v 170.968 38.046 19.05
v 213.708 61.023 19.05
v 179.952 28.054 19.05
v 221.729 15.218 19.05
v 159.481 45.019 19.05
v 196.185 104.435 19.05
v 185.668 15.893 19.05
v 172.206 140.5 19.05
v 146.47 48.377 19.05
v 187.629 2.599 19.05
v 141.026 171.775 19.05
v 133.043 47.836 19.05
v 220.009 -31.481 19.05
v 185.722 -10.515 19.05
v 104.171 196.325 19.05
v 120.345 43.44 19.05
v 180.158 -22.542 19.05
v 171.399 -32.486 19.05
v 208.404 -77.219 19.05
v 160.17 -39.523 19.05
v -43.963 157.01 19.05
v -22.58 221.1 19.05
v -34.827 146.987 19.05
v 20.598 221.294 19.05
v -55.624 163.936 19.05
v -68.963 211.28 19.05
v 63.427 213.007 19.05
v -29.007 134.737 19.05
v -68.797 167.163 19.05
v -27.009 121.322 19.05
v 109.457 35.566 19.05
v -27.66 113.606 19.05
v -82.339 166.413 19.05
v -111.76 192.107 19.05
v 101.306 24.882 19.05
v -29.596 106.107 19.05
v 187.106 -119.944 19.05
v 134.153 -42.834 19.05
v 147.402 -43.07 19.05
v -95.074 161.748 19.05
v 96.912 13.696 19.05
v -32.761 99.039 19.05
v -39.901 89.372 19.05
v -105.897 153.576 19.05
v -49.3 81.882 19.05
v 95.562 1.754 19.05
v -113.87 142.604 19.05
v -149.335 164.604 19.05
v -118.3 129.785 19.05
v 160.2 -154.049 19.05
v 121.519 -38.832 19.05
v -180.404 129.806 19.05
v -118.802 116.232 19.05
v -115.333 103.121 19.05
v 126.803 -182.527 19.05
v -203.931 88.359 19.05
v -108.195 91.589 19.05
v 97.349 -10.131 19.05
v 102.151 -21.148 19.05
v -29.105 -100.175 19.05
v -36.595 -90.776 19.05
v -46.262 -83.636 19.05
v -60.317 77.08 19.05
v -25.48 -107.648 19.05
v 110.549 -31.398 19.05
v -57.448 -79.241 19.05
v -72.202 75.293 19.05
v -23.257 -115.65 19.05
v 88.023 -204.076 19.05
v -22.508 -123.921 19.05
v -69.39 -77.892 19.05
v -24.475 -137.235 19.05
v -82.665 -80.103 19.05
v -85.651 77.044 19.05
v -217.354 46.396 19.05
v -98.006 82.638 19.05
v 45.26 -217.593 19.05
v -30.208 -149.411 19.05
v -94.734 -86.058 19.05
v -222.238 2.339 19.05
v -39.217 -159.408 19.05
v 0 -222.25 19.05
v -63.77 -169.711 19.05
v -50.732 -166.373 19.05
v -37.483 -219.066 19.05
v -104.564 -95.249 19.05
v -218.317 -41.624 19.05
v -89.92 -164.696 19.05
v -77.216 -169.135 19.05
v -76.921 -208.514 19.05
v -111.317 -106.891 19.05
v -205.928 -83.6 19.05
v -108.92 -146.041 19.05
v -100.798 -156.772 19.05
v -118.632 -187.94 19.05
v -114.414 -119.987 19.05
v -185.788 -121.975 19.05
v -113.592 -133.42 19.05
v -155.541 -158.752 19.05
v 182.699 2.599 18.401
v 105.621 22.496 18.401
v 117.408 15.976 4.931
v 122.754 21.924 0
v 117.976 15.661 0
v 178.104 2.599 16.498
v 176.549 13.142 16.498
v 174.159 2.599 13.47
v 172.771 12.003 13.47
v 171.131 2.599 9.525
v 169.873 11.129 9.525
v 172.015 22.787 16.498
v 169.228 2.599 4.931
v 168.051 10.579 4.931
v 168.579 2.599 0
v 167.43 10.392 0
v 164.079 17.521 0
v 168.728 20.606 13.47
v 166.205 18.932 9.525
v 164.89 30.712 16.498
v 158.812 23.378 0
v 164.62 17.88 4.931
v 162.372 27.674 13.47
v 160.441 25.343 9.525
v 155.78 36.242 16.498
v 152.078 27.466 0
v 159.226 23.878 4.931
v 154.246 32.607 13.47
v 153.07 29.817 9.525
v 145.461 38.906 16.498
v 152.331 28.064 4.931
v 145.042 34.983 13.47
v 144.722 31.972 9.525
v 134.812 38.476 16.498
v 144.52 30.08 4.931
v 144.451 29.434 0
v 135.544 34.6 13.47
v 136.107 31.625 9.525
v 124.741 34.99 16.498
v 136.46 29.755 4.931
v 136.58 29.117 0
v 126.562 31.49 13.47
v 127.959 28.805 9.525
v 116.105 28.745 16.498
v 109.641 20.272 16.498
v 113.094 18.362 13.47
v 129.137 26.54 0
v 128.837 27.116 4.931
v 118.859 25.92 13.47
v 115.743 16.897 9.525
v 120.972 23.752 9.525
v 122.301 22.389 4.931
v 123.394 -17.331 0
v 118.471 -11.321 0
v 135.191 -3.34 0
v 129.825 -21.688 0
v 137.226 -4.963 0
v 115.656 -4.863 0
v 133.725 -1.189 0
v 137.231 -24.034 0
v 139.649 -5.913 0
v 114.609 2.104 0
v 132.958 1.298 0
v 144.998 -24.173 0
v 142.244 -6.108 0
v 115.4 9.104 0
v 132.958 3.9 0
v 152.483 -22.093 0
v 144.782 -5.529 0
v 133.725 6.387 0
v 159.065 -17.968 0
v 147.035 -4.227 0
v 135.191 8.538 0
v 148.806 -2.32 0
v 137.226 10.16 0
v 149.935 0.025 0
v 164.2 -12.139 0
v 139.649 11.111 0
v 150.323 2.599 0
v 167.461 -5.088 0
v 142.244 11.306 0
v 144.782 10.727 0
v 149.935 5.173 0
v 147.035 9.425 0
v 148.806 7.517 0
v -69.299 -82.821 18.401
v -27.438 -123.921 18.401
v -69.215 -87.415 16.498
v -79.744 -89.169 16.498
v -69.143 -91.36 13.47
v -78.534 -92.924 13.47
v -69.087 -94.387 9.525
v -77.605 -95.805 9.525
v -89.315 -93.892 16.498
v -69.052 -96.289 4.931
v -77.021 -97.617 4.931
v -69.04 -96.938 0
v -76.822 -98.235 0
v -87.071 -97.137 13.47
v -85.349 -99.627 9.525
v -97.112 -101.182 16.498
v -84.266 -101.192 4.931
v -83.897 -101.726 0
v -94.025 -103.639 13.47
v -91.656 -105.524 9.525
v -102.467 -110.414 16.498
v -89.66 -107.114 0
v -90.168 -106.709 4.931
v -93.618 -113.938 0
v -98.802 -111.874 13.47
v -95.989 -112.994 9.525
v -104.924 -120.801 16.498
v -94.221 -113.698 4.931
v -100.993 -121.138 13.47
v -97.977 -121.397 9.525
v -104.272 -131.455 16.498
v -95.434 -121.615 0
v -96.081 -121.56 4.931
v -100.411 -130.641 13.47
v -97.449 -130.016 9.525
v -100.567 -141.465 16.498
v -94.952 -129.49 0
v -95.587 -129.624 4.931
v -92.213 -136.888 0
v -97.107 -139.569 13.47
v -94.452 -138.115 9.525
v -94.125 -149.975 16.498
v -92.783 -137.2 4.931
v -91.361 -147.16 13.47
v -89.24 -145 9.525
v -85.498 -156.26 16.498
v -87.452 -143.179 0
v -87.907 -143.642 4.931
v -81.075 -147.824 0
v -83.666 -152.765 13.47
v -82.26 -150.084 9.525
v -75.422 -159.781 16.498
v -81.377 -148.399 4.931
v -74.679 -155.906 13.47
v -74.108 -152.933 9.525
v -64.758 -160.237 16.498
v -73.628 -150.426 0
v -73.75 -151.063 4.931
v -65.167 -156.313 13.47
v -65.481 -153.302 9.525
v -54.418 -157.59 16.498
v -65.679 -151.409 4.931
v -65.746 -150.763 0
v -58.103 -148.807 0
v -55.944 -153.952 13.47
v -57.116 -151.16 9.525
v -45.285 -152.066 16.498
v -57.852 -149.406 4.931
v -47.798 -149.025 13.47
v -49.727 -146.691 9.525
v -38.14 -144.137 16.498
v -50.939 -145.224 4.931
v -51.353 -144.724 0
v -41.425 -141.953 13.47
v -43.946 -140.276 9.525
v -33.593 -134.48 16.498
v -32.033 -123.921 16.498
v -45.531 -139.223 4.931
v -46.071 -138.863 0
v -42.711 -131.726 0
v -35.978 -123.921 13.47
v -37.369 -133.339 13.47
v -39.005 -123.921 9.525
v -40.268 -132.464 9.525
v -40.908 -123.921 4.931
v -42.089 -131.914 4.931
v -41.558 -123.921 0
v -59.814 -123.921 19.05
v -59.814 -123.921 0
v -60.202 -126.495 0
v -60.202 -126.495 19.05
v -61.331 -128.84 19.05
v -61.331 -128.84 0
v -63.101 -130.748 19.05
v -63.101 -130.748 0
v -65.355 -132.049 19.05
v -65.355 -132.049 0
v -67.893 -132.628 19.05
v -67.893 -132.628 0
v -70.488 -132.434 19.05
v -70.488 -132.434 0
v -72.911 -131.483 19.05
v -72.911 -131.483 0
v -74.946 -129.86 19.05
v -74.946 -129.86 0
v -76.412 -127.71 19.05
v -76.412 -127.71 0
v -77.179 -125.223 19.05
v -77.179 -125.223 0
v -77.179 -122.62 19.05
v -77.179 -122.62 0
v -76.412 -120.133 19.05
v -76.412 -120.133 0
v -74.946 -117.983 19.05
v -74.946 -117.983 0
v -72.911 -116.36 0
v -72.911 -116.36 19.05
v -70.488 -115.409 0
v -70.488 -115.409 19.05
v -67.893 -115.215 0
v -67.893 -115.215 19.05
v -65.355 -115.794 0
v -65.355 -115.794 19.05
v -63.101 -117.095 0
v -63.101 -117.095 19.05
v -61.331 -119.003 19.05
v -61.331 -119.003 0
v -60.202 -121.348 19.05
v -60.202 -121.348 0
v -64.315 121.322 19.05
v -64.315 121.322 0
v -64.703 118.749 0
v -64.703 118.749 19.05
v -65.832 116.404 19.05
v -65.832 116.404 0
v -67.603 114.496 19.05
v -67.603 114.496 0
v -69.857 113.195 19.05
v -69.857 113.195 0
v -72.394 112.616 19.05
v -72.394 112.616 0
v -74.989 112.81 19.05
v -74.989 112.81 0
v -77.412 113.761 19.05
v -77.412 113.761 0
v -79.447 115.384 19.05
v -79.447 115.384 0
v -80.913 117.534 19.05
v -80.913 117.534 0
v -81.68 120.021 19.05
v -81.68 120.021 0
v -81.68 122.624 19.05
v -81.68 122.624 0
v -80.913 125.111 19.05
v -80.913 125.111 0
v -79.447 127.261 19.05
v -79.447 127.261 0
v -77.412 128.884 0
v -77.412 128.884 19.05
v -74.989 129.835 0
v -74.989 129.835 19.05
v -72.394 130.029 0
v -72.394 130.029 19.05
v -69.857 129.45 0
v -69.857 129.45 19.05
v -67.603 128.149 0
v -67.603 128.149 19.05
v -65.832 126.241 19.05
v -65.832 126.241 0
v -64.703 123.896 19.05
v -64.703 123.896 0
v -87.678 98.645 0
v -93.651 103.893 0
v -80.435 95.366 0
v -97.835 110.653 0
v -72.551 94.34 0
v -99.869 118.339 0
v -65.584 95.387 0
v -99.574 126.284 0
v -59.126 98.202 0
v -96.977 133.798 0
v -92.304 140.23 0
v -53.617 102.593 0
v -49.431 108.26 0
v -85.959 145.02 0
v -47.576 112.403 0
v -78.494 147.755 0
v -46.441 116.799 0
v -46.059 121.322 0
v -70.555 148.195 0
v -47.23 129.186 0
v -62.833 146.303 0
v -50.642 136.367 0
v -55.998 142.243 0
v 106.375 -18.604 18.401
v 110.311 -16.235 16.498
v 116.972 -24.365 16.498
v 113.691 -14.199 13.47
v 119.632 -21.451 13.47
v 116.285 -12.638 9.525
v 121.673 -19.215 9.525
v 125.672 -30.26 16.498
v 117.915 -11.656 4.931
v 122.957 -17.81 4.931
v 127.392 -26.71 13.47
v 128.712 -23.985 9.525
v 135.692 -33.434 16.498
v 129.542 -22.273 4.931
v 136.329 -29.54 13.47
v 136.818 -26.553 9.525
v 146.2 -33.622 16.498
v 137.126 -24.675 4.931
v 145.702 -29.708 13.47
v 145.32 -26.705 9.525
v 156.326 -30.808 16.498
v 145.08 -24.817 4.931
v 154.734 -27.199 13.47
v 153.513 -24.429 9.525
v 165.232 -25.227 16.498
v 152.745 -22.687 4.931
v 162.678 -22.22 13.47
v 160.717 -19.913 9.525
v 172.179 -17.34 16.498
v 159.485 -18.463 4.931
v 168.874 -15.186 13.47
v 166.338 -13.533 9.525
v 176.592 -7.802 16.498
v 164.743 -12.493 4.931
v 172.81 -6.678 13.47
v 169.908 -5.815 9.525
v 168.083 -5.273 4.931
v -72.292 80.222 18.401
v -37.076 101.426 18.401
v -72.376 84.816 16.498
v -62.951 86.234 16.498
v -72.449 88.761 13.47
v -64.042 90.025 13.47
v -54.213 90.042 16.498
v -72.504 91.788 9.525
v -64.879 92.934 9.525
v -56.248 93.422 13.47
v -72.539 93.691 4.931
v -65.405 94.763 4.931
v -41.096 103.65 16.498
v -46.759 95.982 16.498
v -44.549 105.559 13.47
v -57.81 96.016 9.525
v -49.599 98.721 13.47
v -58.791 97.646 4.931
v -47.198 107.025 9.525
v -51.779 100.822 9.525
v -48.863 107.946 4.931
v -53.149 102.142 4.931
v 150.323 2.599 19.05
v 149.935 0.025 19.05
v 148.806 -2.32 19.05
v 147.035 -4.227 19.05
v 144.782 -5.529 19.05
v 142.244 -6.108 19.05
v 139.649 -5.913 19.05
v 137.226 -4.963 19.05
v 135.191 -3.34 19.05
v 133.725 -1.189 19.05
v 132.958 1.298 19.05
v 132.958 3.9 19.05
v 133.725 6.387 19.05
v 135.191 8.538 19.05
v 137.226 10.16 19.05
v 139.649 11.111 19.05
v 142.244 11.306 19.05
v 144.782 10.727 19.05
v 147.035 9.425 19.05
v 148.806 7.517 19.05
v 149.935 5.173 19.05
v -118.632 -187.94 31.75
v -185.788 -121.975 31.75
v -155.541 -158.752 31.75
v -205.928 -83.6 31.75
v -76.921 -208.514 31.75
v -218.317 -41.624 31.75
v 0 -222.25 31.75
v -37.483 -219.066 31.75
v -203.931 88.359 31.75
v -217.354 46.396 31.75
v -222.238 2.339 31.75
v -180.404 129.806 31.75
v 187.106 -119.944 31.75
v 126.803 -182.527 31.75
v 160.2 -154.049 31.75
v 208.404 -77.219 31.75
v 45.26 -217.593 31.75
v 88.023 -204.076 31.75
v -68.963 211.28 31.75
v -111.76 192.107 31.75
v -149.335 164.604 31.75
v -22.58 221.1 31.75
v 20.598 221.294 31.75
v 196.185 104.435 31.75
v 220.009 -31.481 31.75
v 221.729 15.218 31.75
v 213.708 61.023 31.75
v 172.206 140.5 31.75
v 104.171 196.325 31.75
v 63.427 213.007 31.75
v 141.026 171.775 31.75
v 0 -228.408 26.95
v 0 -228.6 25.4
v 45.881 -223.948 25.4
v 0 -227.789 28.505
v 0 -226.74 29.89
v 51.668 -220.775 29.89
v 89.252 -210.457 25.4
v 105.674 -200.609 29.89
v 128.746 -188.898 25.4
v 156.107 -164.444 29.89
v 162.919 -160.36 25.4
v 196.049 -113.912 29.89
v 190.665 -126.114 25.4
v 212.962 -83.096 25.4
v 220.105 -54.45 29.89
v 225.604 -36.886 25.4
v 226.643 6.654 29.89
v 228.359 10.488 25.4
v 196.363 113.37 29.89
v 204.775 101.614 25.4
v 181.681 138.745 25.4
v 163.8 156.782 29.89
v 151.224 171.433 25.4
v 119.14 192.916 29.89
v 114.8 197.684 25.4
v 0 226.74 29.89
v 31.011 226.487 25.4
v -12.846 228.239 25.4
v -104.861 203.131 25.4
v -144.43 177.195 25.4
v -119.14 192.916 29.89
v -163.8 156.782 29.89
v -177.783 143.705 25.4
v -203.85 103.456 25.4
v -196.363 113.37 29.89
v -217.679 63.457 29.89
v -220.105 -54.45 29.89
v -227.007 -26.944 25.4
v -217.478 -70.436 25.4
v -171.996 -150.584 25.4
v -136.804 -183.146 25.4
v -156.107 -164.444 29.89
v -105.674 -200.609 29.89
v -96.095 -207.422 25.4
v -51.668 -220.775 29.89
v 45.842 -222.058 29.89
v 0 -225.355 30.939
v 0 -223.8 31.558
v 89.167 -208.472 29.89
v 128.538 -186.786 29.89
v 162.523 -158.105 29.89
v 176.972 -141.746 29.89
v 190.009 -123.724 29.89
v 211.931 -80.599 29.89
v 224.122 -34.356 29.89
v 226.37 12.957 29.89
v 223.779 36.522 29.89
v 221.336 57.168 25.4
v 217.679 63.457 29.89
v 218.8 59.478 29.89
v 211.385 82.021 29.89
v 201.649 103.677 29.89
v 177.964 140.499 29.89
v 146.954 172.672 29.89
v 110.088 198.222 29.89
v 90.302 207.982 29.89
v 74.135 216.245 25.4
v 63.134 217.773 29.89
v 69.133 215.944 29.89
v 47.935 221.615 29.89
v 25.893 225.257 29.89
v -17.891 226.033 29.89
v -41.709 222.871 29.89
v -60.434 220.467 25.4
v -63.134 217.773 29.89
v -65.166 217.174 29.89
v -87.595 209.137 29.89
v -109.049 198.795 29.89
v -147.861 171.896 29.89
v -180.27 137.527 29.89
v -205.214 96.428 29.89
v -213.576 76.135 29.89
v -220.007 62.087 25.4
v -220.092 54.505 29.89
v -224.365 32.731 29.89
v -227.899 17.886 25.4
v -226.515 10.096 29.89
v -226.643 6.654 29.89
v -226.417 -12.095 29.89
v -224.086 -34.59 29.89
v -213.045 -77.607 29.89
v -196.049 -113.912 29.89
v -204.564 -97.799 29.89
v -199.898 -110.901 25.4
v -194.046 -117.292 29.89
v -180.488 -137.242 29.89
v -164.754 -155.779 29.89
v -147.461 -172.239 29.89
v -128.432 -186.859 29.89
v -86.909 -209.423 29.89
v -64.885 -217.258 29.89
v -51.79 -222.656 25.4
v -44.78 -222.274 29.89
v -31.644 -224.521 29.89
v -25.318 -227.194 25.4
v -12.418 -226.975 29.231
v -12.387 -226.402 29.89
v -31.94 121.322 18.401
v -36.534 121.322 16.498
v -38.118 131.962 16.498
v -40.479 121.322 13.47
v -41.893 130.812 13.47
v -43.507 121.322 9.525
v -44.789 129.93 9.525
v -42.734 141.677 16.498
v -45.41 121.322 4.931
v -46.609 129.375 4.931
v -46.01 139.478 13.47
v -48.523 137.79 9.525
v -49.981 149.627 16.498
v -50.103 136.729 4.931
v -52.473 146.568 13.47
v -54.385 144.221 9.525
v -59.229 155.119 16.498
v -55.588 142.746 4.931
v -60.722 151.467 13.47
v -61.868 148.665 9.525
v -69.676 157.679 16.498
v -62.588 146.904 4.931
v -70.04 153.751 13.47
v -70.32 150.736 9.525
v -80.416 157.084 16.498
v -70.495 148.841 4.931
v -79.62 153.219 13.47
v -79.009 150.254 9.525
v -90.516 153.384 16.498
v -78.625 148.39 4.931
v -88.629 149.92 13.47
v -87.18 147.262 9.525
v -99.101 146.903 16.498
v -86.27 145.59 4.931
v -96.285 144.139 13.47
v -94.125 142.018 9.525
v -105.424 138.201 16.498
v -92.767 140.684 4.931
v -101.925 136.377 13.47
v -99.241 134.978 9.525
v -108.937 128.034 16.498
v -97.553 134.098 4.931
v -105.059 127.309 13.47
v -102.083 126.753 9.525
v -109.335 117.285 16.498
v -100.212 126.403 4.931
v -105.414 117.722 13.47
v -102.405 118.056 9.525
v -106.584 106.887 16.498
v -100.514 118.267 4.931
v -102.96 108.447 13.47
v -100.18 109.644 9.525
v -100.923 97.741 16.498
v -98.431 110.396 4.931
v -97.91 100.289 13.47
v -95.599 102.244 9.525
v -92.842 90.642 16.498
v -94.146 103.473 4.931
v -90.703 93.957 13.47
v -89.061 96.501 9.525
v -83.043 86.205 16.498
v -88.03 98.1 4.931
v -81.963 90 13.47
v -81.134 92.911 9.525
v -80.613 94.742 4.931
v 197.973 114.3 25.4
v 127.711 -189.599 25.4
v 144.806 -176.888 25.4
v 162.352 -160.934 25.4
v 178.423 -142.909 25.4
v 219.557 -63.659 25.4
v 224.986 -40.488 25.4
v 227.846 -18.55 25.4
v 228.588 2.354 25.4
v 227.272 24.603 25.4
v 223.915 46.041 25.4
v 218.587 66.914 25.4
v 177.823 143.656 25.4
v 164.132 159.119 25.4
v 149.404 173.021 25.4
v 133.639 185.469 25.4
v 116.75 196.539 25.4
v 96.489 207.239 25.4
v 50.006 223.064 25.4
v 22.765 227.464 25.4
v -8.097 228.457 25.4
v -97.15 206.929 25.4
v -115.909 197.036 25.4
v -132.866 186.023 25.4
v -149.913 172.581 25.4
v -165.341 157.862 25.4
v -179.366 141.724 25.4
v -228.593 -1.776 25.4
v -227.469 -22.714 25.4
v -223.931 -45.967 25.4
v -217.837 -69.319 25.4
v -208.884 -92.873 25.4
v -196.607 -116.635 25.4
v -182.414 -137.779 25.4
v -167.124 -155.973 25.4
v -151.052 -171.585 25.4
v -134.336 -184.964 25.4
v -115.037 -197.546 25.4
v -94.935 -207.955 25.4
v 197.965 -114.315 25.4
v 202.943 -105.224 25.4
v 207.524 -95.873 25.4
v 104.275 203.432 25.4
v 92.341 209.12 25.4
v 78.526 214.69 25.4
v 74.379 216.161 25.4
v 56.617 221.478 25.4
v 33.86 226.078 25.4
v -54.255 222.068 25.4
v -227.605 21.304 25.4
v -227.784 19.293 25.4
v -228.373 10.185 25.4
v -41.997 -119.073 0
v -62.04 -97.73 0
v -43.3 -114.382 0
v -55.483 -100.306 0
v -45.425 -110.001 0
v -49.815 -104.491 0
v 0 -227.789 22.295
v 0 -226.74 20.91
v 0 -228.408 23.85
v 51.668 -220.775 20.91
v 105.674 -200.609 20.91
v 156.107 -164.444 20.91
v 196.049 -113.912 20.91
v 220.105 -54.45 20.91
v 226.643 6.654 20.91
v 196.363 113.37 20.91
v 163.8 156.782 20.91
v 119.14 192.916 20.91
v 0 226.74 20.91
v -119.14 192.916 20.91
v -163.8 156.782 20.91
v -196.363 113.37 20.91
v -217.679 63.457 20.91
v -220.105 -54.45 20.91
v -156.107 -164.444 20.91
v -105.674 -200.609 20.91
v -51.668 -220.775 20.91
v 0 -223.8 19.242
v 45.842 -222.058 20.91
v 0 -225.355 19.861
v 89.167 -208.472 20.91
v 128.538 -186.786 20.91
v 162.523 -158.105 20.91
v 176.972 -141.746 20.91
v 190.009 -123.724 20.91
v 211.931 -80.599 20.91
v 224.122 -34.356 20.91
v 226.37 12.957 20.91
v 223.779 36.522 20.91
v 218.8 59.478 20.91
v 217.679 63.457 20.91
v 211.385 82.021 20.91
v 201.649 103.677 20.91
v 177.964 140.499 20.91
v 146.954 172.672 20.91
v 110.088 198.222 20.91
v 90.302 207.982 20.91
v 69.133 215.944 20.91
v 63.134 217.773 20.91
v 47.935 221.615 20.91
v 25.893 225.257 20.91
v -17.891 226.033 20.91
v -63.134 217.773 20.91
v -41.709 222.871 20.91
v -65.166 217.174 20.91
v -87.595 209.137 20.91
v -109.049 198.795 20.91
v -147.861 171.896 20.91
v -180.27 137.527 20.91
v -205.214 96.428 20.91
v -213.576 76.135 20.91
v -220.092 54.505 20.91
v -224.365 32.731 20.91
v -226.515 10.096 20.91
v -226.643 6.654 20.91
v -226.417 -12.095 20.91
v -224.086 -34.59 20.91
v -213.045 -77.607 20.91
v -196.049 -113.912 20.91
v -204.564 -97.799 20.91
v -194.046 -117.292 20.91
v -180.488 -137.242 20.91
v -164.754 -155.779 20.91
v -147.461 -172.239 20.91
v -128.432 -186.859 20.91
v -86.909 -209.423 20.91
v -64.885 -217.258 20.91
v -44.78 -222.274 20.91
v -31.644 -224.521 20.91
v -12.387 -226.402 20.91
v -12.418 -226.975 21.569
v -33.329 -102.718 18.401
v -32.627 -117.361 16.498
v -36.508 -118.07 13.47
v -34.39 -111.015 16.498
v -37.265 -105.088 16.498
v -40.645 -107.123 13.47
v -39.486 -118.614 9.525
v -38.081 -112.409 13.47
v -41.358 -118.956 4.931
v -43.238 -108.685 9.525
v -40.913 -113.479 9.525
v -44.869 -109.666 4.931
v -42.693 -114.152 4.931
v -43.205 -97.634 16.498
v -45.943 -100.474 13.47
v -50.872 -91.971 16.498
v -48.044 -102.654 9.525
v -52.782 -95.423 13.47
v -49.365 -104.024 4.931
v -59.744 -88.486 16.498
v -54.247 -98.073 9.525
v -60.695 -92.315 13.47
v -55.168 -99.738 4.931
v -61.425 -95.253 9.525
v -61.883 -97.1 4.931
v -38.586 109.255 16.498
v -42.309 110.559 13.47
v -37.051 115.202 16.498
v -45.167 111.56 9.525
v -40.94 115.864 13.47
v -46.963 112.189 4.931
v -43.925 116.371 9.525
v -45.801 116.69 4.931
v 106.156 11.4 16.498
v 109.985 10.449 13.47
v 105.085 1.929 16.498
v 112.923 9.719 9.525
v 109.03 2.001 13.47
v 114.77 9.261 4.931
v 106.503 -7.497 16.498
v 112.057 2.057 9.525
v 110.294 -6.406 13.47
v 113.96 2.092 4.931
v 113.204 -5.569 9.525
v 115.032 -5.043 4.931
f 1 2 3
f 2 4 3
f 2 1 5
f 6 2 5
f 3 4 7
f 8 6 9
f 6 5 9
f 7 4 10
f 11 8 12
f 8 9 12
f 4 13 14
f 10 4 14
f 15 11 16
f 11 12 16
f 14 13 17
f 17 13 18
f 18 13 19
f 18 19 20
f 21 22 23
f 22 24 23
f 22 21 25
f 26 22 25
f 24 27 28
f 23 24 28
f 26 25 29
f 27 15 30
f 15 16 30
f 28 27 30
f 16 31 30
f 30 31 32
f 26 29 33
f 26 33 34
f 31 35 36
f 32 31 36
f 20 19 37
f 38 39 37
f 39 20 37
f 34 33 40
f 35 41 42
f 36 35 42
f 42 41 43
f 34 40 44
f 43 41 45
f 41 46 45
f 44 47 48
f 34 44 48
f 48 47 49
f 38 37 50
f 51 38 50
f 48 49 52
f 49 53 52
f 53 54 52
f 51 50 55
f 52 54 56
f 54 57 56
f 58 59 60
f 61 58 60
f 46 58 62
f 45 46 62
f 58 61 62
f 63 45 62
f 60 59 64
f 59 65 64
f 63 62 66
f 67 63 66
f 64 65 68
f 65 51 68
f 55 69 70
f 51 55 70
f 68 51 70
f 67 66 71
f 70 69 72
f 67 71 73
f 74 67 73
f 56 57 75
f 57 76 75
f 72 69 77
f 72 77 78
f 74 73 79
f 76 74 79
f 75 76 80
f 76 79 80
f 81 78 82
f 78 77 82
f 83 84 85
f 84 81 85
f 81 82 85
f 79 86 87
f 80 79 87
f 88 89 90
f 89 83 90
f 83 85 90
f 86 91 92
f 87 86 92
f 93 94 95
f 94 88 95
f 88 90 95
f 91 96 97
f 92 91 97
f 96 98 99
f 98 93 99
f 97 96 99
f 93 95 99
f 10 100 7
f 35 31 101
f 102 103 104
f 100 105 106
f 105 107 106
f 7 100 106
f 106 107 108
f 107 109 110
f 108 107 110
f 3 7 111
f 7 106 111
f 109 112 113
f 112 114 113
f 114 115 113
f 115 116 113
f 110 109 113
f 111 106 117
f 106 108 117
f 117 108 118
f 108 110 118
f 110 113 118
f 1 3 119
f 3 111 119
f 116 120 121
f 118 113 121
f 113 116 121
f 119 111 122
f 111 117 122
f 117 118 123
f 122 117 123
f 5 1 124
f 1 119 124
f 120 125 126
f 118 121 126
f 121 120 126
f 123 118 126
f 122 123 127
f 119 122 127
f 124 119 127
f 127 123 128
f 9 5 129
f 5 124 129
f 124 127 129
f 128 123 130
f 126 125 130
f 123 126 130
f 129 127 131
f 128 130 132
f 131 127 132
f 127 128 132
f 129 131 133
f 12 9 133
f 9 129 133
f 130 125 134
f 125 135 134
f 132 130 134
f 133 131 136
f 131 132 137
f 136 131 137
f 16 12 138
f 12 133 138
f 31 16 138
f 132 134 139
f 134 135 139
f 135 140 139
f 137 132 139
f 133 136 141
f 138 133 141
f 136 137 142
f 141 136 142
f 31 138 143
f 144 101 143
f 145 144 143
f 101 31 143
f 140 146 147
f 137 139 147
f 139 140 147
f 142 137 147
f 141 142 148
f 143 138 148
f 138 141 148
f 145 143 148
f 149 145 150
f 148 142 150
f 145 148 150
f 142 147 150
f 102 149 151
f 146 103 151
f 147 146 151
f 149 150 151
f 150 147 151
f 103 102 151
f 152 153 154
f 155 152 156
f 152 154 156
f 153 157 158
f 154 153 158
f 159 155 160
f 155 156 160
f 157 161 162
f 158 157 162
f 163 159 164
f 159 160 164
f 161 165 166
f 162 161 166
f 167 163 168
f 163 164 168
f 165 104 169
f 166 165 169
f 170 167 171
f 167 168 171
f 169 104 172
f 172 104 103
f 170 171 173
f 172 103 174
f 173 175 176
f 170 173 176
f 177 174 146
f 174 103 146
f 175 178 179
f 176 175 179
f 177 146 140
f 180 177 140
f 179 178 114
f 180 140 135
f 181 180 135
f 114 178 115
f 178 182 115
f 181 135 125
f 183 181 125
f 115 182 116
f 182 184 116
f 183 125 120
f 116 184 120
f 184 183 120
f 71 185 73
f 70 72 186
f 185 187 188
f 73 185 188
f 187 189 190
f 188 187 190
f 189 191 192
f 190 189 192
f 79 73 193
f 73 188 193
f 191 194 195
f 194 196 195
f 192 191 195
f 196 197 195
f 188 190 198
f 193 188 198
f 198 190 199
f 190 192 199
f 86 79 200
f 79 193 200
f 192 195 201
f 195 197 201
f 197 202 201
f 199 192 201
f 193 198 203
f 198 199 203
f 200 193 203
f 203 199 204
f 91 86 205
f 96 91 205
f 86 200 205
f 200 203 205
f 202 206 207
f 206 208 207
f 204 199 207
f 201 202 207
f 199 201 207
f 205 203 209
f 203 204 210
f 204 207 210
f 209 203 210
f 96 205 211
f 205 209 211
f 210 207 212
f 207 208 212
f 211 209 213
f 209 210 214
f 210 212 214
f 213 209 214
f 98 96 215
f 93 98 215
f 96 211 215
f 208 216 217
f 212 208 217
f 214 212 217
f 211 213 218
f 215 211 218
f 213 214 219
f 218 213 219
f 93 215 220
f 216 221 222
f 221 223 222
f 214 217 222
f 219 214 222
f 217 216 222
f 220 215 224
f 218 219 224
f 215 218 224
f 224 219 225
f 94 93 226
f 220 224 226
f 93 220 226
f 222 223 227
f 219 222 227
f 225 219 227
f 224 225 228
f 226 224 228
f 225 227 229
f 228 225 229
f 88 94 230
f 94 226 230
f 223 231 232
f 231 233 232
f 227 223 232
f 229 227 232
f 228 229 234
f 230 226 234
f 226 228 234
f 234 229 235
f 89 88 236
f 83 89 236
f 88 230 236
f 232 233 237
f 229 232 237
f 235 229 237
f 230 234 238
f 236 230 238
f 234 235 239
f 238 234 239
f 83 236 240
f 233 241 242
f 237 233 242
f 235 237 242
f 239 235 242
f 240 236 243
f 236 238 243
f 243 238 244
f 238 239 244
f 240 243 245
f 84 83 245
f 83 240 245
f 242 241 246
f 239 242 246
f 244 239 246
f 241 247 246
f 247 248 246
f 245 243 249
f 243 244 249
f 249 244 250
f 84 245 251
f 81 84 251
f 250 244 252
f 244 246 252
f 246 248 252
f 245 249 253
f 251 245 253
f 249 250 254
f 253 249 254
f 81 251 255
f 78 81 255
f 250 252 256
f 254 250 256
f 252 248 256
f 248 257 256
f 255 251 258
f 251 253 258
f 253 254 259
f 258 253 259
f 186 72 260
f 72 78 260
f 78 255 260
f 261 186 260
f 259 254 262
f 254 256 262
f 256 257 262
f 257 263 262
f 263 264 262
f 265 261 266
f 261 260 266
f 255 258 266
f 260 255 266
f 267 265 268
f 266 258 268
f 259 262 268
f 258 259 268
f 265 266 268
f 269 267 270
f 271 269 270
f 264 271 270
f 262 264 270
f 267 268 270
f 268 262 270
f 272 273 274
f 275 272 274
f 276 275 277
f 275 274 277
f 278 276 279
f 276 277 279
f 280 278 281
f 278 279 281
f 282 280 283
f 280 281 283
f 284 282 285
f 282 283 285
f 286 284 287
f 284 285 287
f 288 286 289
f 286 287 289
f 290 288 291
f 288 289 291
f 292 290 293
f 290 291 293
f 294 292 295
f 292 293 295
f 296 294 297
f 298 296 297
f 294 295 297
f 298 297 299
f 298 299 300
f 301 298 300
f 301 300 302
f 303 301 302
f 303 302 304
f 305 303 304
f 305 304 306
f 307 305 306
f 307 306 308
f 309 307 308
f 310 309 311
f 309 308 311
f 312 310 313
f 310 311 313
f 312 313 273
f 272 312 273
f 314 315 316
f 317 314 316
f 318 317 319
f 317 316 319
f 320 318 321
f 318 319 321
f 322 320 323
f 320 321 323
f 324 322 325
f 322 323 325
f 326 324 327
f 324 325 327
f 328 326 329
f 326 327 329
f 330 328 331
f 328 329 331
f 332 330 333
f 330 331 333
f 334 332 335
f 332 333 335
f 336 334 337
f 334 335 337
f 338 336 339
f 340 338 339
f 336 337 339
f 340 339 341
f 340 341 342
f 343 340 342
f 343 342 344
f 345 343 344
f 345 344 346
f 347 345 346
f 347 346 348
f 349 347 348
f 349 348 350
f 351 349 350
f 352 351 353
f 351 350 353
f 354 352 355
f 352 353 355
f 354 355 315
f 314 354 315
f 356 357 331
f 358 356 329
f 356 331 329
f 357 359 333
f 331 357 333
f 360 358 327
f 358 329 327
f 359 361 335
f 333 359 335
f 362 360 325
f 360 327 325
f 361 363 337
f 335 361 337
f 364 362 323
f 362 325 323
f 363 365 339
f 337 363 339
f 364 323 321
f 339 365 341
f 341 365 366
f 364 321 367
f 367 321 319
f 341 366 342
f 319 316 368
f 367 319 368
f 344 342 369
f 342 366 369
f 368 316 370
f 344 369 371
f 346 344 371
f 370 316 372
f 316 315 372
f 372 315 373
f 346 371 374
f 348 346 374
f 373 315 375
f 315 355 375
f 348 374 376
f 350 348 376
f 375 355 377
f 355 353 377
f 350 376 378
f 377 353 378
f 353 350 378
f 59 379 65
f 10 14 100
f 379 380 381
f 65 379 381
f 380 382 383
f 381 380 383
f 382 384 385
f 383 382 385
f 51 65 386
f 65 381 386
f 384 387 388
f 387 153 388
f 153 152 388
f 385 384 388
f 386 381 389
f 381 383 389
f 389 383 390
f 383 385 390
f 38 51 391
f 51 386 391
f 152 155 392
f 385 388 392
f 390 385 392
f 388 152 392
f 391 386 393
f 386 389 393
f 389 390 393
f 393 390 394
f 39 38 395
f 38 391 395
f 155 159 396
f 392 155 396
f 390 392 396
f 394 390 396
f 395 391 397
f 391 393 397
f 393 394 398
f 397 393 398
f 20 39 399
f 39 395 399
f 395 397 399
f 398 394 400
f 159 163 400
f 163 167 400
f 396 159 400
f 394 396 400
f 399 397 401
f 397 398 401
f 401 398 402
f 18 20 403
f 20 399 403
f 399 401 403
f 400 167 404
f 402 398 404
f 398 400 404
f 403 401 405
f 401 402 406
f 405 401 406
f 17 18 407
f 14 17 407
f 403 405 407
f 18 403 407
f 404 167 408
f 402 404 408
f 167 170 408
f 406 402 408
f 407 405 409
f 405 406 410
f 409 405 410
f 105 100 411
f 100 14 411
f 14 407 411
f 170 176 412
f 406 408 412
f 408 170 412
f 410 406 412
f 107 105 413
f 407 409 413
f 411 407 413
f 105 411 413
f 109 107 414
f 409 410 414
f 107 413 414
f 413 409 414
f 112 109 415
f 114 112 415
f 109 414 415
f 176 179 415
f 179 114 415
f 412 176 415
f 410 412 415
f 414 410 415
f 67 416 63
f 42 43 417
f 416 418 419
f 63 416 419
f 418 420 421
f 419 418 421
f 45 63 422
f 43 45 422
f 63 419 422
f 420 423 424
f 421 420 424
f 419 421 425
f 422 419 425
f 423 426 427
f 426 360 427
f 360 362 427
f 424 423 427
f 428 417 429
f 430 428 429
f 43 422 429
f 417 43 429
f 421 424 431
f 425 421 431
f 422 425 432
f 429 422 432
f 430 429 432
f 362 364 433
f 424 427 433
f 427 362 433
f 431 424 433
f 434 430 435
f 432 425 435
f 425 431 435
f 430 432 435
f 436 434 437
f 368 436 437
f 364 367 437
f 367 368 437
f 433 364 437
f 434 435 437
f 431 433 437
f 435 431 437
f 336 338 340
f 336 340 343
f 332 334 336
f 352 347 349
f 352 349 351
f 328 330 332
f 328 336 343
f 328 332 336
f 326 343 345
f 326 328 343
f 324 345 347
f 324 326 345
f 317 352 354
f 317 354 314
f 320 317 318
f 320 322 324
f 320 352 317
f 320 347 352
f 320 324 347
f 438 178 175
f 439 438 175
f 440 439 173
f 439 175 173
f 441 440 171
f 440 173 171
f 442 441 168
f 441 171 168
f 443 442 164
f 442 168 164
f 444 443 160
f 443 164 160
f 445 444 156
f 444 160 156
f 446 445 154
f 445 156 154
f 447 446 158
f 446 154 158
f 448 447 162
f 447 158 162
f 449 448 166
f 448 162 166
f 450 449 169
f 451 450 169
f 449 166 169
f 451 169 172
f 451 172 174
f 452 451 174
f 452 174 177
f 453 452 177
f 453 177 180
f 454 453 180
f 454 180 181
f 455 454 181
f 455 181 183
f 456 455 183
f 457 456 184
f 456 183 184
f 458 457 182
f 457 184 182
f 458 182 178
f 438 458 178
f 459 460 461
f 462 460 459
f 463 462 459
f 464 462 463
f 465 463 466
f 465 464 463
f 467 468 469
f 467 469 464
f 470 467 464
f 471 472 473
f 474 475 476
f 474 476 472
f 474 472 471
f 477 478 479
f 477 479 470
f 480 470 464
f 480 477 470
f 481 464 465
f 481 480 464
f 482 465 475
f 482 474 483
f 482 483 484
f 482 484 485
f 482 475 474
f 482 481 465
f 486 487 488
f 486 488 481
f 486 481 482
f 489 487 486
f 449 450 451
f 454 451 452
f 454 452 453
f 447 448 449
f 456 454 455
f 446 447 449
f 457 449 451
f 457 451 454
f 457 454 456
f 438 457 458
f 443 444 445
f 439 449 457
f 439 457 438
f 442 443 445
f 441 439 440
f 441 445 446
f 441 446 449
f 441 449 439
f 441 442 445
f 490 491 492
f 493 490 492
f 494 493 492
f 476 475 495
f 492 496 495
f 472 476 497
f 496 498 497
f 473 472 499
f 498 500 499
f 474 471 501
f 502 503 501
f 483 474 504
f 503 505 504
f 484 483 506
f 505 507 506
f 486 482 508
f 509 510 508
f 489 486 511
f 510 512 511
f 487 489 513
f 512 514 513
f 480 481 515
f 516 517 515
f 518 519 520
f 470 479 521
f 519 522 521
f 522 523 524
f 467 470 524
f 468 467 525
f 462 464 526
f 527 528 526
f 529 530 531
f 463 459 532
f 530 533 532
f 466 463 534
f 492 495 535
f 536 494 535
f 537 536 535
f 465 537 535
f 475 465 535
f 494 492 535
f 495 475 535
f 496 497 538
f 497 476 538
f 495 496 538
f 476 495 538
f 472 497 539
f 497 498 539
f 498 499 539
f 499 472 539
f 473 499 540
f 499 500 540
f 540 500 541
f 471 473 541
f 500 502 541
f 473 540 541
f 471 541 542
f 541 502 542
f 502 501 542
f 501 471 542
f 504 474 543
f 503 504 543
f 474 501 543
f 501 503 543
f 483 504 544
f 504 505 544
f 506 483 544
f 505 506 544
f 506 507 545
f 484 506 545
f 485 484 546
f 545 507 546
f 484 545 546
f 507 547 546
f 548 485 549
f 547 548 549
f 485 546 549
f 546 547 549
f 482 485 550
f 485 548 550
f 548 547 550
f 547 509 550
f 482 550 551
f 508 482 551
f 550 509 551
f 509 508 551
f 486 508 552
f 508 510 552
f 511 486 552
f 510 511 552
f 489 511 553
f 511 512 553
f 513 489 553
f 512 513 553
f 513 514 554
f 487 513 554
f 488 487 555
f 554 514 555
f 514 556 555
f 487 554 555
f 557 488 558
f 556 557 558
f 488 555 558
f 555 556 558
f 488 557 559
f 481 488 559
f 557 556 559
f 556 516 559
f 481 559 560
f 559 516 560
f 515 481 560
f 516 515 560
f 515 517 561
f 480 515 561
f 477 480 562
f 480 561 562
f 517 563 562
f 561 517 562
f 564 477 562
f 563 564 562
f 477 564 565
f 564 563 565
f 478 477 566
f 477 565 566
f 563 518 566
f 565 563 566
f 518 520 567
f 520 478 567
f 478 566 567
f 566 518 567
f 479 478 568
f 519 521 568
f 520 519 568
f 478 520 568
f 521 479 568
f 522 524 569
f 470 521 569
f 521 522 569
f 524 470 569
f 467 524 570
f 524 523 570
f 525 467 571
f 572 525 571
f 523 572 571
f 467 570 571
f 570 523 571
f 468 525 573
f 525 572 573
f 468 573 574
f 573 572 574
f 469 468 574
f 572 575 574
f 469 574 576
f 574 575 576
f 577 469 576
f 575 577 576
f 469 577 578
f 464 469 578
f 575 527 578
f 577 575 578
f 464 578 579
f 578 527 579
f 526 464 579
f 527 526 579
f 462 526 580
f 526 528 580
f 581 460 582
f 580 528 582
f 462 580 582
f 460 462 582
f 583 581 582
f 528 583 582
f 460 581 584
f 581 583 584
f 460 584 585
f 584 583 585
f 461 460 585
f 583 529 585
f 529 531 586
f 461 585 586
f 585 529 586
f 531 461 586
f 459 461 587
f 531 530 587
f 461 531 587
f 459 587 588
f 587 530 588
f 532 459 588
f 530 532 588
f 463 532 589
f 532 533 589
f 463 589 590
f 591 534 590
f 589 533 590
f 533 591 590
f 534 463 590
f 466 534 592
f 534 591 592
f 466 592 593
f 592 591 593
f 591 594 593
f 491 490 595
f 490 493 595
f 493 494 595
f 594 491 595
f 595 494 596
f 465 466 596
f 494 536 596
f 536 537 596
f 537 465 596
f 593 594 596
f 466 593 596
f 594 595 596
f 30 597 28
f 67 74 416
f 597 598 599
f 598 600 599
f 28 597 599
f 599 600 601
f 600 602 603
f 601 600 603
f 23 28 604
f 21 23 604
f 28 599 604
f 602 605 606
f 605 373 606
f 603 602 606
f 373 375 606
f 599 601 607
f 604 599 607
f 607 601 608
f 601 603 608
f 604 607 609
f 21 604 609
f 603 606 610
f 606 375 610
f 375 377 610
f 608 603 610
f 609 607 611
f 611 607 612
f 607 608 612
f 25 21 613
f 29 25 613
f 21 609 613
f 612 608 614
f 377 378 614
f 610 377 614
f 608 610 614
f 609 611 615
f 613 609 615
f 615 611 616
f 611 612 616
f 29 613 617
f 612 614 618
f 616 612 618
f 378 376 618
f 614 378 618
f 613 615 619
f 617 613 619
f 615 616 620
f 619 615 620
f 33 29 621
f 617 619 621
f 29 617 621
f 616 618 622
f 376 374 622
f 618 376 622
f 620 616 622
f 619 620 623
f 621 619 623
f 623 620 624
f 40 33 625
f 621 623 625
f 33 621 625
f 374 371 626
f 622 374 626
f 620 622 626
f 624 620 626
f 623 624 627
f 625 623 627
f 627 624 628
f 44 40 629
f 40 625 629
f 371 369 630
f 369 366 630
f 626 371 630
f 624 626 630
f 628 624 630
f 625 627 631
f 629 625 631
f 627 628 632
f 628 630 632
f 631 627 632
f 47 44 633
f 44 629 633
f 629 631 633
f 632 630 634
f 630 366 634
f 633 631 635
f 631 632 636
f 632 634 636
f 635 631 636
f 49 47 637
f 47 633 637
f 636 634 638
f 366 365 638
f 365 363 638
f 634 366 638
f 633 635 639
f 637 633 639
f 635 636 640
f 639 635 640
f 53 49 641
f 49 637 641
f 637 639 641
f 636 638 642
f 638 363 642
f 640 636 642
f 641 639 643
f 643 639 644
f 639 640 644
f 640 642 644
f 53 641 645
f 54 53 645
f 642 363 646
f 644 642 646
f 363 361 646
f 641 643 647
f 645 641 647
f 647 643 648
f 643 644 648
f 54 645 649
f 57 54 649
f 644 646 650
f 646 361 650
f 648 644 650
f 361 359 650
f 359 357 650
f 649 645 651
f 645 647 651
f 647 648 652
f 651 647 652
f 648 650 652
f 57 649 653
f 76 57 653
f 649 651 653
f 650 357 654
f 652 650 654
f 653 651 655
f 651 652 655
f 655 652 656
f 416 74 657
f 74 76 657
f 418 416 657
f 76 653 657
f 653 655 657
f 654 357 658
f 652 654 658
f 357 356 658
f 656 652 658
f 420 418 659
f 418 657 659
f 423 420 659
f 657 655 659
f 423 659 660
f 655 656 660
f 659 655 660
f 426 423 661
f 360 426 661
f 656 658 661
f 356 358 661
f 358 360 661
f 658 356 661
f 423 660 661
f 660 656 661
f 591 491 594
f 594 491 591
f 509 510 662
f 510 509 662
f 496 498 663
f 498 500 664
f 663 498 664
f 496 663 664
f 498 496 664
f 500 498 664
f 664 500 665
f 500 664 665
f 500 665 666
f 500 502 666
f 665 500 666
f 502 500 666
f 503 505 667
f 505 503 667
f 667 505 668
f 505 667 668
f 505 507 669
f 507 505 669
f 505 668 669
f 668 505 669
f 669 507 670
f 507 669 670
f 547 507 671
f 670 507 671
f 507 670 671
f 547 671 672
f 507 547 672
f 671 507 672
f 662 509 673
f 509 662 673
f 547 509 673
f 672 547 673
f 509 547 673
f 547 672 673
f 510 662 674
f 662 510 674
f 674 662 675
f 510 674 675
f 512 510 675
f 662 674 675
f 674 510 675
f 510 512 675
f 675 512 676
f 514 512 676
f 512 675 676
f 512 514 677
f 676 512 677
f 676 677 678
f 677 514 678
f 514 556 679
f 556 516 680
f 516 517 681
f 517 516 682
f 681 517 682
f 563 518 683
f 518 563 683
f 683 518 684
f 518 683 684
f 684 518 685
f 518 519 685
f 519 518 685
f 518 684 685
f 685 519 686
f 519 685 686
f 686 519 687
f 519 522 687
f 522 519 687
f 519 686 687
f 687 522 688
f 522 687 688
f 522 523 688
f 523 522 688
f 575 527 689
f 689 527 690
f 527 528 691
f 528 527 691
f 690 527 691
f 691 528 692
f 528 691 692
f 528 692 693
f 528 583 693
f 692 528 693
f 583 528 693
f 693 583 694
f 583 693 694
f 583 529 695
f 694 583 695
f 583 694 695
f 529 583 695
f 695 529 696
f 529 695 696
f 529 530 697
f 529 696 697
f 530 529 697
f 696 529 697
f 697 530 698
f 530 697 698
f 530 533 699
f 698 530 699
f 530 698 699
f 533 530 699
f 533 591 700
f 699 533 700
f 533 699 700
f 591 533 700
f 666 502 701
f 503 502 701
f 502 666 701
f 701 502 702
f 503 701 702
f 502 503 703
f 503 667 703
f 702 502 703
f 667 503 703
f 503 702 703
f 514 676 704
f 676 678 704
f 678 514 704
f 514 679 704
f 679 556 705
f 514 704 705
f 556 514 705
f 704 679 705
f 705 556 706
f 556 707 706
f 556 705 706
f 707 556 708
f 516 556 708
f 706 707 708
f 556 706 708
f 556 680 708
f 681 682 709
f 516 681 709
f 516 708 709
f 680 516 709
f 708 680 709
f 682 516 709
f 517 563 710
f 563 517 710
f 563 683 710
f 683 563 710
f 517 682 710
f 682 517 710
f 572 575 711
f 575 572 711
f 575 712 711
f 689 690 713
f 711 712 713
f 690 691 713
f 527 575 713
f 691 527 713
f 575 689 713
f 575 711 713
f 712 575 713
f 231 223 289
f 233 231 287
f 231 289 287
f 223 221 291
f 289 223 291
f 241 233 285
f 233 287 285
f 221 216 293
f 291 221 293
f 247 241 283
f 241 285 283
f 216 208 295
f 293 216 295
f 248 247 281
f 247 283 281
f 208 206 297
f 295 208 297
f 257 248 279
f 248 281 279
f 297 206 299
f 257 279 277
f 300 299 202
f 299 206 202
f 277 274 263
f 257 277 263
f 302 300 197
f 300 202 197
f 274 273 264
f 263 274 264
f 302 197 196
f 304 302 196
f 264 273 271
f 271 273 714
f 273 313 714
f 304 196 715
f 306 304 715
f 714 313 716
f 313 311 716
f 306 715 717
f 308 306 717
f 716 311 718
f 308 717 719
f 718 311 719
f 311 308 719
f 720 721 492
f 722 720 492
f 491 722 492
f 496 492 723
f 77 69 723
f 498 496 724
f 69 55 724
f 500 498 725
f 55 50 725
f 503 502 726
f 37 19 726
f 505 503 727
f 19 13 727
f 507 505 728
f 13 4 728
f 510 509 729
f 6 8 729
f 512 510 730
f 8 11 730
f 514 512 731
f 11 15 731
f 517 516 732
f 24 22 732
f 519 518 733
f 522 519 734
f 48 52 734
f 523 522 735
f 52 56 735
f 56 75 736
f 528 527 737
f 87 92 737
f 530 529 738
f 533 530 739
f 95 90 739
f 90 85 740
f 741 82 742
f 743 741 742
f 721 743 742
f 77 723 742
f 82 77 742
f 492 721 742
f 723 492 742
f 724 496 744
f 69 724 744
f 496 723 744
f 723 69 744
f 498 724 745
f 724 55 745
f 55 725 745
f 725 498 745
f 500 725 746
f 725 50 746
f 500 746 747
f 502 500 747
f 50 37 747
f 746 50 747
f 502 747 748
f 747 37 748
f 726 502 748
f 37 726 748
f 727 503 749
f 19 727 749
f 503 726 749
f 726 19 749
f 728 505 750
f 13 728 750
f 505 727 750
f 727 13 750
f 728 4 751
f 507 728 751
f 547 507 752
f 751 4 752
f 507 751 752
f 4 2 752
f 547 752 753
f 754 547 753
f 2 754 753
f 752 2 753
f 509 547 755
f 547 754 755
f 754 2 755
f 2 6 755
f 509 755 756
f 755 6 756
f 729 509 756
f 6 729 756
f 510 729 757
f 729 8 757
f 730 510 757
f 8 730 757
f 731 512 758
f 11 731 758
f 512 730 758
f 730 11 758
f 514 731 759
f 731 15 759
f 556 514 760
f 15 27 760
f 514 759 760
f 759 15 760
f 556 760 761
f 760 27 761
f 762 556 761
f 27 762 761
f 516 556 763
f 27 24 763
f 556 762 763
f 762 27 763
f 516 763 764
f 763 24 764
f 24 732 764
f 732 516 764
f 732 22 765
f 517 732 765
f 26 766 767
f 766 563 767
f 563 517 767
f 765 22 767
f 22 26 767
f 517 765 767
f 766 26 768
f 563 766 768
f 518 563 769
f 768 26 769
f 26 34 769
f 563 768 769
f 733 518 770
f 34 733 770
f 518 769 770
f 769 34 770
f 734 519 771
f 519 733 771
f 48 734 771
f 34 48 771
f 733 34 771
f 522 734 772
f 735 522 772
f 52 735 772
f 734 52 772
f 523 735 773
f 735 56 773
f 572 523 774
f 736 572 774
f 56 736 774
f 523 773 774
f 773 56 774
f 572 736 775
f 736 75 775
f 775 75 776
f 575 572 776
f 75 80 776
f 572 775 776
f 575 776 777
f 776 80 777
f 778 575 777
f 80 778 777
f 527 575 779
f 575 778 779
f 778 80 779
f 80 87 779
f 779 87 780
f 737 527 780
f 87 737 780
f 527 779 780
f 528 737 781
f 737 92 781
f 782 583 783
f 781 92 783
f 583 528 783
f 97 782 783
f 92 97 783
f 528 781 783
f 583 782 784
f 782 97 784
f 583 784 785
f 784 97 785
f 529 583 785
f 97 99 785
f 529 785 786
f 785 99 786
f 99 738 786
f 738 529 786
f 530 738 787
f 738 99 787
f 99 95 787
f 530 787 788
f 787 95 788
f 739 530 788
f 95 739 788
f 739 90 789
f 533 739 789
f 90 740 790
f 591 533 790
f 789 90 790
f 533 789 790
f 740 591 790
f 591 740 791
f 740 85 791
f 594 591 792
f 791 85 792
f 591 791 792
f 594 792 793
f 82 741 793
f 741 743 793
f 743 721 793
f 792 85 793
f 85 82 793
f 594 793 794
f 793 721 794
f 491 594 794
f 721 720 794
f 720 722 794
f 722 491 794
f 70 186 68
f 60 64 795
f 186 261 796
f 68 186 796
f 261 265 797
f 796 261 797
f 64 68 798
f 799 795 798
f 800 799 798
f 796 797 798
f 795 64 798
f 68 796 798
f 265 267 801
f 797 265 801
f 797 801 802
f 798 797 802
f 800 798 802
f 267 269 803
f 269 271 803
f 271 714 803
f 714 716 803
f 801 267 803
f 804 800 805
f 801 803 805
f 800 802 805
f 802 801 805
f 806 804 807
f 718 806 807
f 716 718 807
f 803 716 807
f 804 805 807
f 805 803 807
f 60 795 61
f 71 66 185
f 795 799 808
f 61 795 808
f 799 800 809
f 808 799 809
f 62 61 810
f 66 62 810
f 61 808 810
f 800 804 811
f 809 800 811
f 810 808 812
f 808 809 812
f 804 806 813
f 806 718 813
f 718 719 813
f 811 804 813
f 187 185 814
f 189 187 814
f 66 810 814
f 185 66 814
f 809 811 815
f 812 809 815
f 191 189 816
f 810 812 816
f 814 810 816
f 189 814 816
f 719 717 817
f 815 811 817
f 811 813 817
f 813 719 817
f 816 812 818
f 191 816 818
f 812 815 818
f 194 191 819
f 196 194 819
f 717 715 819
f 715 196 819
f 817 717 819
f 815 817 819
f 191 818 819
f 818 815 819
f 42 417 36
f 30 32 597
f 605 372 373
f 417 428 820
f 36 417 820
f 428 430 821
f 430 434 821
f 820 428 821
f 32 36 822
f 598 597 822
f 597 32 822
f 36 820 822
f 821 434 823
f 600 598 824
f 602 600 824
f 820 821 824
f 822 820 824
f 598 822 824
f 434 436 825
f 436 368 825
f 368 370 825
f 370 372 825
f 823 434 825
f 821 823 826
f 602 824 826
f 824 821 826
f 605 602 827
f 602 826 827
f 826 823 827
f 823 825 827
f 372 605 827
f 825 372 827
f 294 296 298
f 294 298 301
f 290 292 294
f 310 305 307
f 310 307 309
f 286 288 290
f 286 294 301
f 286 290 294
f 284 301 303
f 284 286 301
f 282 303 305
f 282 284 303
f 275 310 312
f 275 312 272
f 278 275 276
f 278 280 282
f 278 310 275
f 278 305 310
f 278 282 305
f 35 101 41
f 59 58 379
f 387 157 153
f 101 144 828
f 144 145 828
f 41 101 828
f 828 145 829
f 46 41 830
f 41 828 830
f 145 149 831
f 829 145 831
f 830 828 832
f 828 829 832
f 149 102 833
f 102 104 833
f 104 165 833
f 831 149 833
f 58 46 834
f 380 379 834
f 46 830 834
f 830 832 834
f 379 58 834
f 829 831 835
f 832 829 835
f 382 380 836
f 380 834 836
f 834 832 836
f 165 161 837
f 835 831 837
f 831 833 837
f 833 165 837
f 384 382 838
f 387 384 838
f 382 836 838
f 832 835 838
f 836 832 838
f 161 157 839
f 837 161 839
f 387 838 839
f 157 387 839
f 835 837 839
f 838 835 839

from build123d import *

# Parameters (mm, degrees)
F1_DEPTH = 31.75
F3_DEPTH = 19.05
F4_R     = 19.04999
F5_R     = 6.34999
F6_R     = 8.73125
F7_R     = 8.73125
F8_R     = 8.73125
F9_DEPTH = 19.05


# Not quite as in the source:
# - a fillet or chamfer is up to 0.001 mm smaller than in the source, because OpenCascade refuses the exact size


with BuildPart() as f1:
    # F0 (on Top) → F1 (new body)
    with BuildSketch(Plane.XY):
        with BuildLine():
            add(Edge.make_bspline(
                [(0, -228.6), (395.9468146102, -228.6), (197.9734073051, 114.3), (0, 457.2), (-197.9734073051, 114.3), (-395.9468146102, -228.6), (0, -228.6)],
                knots=[0, 0, 0, 2.0943951024, 2.0943951024, 4.1887902048, 4.1887902048, 6.2831853072, 6.2831853072, 6.2831853072], degree=2, weights=[1, 0.5, 1, 0.5, 1, 0.5, 1]))
        make_face()
    extrude(amount=F1_DEPTH)

    # F2 (on face) → F3 (cut)
    with BuildSketch(Plane(origin=(0, 0, 0), x_dir=(1, 0, 0), z_dir=(0, 0, -1))):
        with BuildLine():
            add(Edge.make_bspline(
                [(0, 228.6), (395.9468146102, 228.6), (197.9734073051, -114.3), (0, -457.2), (-197.9734073051, -114.3), (-395.9468146102, 228.6), (0, 228.6)],
                knots=[0, 0, 0, 2.0943951024, 2.0943951024, 4.1887902048, 4.1887902048, 6.2831853072, 6.2831853072, 6.2831853072], degree=2, weights=[1, 0.5, 1, 0.5, 1, 0.5, 1]))
        make_face()
        with BuildLine():
            ThreePointArc((-41.557586209, 123.9214253546), (-42.5423564602, 116.6976312088), (-45.4247989454, 110.0010276198))
            Line((-45.4247989454, 110.0010276198), (118.4713582711, 11.3214710191))
            ThreePointArc((118.4713582711, 11.3214710191), (148.8154396806, 23.4038030331), (168.5791455348, -2.5989267157))
            ThreePointArc((168.5791455348, -2.5989267157), (148.3370211672, -28.7298483188), (117.9760838338, -15.6614839614))
            Line((117.9760838338, -15.6614839614), (-49.4309976248, -108.2599413932))
            ThreePointArc((-49.4309976248, -108.2599413932), (-46.9156377226, -114.5771230065), (-46.0590593257, -121.3224986389))
            ThreePointArc((-46.0590593257, -121.3224986389), (-92.3039134421, -140.2296260962), (-72.5512848884, -94.3395436584))
            Line((-72.5512848884, -94.3395436584), (-69.0403606463, 96.9384703741))
            ThreePointArc((-69.0403606463, 96.9384703741), (-87.4522136664, 143.178779471), (-41.557586209, 123.9214253546))
        make_face(mode=Mode.SUBTRACT)
        with BuildLine():
            Line((118.4713582711, 11.3214710191), (-45.4247989454, 110.0010276198))
            ThreePointArc((-45.4247989454, 110.0010276198), (-55.4825289633, 100.3058636536), (-69.0403606463, 96.9384703741))
            Line((-69.0403606463, 96.9384703741), (-72.5512848884, -94.3395436584))
            ThreePointArc((-72.5512848884, -94.3395436584), (-59.1261615909, -98.2022113753), (-49.4309976248, -108.2599413932))
            Line((-49.4309976248, -108.2599413932), (117.9760838338, -15.6614839614))
            ThreePointArc((117.9760838338, -15.6614839614), (114.6086905542, -2.1036522784), (118.4713582711, 11.3214710191))
        make_face()
    extrude(amount=-F3_DEPTH, mode=Mode.SUBTRACT)

    # F4 (radius 19.05 in the source; OpenCascade refuses exactly that, so slightly less here)
    f4_edges = [f1.edges().sort_by_distance(p)[0] for p in [
        (-91.665373, -137.841823, 19.05),
        (165.207207, -10.463631, 19.05),
        (-73.541834, 148.305454, 19.05),
    ]]
    fillet(f4_edges, radius=F4_R)

    # F5 (radius 6.35 in the source; OpenCascade refuses exactly that, so slightly less here)
    f5_edges = [f1.edges().sort_by_distance(p)[0] for p in [
        (0, 228.6, 31.75),
        (0, 228.6, 19.05),
    ]]
    fillet(f5_edges, radius=F5_R)

    # F6 (on face) + F7 (on face) + F8 (on face) → F9 (cut)
    with BuildSketch(Plane(origin=(0, 0, 0), x_dir=(1, 0, 0), z_dir=(0, 0, -1))):
        with Locations((-68.545086209, 123.9214253546)):
            Circle(F6_R)
    with BuildSketch(Plane(origin=(0, 0, 0), x_dir=(1, 0, 0), z_dir=(0, 0, -1))):
        with Locations((141.5916455348, -2.5989267157)):
            Circle(F7_R)
    with BuildSketch(Plane(origin=(0, 0, 0), x_dir=(1, 0, 0), z_dir=(0, 0, -1))):
        with Locations((-73.0465593257, -121.3224986389)):
            Circle(F8_R)
    extrude(amount=-F9_DEPTH, mode=Mode.SUBTRACT)


solid = f1.part
